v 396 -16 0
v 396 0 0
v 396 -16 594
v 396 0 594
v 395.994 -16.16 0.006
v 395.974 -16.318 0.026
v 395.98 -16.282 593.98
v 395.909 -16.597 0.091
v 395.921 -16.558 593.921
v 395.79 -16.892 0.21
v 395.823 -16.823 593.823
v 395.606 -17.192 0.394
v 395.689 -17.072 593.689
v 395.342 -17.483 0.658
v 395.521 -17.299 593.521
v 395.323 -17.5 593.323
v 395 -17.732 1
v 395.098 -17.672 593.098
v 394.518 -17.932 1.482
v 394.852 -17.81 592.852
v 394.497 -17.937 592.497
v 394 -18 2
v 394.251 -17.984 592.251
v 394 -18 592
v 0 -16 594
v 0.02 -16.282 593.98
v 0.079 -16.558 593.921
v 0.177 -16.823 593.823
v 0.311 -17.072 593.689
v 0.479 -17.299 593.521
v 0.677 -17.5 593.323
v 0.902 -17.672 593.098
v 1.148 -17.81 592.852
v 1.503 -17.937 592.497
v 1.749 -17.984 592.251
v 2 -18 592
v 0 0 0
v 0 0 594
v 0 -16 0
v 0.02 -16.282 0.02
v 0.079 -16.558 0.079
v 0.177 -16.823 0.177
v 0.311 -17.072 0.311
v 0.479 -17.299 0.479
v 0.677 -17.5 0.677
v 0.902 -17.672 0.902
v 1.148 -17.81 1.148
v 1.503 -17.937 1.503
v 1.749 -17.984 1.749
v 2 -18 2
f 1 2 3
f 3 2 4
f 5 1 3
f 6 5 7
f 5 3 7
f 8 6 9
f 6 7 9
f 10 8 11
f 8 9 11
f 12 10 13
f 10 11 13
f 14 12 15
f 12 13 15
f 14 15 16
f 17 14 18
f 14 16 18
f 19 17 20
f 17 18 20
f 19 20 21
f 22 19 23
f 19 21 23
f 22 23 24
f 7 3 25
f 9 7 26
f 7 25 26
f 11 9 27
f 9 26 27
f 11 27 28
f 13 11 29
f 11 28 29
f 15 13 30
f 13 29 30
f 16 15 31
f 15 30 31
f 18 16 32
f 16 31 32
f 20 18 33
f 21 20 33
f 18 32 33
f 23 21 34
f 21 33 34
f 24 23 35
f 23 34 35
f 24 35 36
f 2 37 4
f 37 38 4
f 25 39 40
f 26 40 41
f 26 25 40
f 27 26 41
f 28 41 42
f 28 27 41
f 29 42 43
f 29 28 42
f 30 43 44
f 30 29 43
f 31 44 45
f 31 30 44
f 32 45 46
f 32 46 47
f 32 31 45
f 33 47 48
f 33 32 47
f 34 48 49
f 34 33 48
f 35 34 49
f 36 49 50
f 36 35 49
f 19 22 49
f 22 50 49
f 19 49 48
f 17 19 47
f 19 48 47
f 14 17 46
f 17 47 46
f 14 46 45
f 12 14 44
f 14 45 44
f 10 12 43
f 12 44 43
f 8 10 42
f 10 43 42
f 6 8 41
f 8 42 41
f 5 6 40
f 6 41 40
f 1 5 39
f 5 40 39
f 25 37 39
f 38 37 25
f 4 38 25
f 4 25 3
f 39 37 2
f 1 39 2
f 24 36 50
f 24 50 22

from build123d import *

# Parameters (mm, degrees)
F0_W     = 47.5491583347
F0_H     = 38.0800664425
F1_DEPTH = 18
F2_DEPTH = 396
F3_DEPTH = 594
F4_R     = 2


with BuildPart() as f1:
    # F0 (on Front) → F1 (new body)
    with BuildSketch(Plane.XZ):
        with Locations((23.7745791674, 19.0400332212)):
            Rectangle(F0_W, F0_H)
    extrude(amount=F1_DEPTH)

    # F2 (add): a face of the model
    f2_faces = [f1.faces().sort_by_distance(p)[0] for p in [
        (0, -9, 19.0400332212),
    ]]
    extrude(f2_faces, amount=-F2_DEPTH)

    # F3 (add): a face of the model
    f3_faces = [f1.faces().sort_by_distance(p)[0] for p in [
        (198, -9, 0),
    ]]
    extrude(f3_faces, amount=-F3_DEPTH)

    # F4
    f4_edges = [f1.edges().sort_by_distance(p)[0] for p in [
        (0, -18, 297),
        (198, -18, 0),
        (396, -18, 297),
        (198, -18, 594),
    ]]
    fillet(f4_edges, radius=F4_R)


solid = f1.part
